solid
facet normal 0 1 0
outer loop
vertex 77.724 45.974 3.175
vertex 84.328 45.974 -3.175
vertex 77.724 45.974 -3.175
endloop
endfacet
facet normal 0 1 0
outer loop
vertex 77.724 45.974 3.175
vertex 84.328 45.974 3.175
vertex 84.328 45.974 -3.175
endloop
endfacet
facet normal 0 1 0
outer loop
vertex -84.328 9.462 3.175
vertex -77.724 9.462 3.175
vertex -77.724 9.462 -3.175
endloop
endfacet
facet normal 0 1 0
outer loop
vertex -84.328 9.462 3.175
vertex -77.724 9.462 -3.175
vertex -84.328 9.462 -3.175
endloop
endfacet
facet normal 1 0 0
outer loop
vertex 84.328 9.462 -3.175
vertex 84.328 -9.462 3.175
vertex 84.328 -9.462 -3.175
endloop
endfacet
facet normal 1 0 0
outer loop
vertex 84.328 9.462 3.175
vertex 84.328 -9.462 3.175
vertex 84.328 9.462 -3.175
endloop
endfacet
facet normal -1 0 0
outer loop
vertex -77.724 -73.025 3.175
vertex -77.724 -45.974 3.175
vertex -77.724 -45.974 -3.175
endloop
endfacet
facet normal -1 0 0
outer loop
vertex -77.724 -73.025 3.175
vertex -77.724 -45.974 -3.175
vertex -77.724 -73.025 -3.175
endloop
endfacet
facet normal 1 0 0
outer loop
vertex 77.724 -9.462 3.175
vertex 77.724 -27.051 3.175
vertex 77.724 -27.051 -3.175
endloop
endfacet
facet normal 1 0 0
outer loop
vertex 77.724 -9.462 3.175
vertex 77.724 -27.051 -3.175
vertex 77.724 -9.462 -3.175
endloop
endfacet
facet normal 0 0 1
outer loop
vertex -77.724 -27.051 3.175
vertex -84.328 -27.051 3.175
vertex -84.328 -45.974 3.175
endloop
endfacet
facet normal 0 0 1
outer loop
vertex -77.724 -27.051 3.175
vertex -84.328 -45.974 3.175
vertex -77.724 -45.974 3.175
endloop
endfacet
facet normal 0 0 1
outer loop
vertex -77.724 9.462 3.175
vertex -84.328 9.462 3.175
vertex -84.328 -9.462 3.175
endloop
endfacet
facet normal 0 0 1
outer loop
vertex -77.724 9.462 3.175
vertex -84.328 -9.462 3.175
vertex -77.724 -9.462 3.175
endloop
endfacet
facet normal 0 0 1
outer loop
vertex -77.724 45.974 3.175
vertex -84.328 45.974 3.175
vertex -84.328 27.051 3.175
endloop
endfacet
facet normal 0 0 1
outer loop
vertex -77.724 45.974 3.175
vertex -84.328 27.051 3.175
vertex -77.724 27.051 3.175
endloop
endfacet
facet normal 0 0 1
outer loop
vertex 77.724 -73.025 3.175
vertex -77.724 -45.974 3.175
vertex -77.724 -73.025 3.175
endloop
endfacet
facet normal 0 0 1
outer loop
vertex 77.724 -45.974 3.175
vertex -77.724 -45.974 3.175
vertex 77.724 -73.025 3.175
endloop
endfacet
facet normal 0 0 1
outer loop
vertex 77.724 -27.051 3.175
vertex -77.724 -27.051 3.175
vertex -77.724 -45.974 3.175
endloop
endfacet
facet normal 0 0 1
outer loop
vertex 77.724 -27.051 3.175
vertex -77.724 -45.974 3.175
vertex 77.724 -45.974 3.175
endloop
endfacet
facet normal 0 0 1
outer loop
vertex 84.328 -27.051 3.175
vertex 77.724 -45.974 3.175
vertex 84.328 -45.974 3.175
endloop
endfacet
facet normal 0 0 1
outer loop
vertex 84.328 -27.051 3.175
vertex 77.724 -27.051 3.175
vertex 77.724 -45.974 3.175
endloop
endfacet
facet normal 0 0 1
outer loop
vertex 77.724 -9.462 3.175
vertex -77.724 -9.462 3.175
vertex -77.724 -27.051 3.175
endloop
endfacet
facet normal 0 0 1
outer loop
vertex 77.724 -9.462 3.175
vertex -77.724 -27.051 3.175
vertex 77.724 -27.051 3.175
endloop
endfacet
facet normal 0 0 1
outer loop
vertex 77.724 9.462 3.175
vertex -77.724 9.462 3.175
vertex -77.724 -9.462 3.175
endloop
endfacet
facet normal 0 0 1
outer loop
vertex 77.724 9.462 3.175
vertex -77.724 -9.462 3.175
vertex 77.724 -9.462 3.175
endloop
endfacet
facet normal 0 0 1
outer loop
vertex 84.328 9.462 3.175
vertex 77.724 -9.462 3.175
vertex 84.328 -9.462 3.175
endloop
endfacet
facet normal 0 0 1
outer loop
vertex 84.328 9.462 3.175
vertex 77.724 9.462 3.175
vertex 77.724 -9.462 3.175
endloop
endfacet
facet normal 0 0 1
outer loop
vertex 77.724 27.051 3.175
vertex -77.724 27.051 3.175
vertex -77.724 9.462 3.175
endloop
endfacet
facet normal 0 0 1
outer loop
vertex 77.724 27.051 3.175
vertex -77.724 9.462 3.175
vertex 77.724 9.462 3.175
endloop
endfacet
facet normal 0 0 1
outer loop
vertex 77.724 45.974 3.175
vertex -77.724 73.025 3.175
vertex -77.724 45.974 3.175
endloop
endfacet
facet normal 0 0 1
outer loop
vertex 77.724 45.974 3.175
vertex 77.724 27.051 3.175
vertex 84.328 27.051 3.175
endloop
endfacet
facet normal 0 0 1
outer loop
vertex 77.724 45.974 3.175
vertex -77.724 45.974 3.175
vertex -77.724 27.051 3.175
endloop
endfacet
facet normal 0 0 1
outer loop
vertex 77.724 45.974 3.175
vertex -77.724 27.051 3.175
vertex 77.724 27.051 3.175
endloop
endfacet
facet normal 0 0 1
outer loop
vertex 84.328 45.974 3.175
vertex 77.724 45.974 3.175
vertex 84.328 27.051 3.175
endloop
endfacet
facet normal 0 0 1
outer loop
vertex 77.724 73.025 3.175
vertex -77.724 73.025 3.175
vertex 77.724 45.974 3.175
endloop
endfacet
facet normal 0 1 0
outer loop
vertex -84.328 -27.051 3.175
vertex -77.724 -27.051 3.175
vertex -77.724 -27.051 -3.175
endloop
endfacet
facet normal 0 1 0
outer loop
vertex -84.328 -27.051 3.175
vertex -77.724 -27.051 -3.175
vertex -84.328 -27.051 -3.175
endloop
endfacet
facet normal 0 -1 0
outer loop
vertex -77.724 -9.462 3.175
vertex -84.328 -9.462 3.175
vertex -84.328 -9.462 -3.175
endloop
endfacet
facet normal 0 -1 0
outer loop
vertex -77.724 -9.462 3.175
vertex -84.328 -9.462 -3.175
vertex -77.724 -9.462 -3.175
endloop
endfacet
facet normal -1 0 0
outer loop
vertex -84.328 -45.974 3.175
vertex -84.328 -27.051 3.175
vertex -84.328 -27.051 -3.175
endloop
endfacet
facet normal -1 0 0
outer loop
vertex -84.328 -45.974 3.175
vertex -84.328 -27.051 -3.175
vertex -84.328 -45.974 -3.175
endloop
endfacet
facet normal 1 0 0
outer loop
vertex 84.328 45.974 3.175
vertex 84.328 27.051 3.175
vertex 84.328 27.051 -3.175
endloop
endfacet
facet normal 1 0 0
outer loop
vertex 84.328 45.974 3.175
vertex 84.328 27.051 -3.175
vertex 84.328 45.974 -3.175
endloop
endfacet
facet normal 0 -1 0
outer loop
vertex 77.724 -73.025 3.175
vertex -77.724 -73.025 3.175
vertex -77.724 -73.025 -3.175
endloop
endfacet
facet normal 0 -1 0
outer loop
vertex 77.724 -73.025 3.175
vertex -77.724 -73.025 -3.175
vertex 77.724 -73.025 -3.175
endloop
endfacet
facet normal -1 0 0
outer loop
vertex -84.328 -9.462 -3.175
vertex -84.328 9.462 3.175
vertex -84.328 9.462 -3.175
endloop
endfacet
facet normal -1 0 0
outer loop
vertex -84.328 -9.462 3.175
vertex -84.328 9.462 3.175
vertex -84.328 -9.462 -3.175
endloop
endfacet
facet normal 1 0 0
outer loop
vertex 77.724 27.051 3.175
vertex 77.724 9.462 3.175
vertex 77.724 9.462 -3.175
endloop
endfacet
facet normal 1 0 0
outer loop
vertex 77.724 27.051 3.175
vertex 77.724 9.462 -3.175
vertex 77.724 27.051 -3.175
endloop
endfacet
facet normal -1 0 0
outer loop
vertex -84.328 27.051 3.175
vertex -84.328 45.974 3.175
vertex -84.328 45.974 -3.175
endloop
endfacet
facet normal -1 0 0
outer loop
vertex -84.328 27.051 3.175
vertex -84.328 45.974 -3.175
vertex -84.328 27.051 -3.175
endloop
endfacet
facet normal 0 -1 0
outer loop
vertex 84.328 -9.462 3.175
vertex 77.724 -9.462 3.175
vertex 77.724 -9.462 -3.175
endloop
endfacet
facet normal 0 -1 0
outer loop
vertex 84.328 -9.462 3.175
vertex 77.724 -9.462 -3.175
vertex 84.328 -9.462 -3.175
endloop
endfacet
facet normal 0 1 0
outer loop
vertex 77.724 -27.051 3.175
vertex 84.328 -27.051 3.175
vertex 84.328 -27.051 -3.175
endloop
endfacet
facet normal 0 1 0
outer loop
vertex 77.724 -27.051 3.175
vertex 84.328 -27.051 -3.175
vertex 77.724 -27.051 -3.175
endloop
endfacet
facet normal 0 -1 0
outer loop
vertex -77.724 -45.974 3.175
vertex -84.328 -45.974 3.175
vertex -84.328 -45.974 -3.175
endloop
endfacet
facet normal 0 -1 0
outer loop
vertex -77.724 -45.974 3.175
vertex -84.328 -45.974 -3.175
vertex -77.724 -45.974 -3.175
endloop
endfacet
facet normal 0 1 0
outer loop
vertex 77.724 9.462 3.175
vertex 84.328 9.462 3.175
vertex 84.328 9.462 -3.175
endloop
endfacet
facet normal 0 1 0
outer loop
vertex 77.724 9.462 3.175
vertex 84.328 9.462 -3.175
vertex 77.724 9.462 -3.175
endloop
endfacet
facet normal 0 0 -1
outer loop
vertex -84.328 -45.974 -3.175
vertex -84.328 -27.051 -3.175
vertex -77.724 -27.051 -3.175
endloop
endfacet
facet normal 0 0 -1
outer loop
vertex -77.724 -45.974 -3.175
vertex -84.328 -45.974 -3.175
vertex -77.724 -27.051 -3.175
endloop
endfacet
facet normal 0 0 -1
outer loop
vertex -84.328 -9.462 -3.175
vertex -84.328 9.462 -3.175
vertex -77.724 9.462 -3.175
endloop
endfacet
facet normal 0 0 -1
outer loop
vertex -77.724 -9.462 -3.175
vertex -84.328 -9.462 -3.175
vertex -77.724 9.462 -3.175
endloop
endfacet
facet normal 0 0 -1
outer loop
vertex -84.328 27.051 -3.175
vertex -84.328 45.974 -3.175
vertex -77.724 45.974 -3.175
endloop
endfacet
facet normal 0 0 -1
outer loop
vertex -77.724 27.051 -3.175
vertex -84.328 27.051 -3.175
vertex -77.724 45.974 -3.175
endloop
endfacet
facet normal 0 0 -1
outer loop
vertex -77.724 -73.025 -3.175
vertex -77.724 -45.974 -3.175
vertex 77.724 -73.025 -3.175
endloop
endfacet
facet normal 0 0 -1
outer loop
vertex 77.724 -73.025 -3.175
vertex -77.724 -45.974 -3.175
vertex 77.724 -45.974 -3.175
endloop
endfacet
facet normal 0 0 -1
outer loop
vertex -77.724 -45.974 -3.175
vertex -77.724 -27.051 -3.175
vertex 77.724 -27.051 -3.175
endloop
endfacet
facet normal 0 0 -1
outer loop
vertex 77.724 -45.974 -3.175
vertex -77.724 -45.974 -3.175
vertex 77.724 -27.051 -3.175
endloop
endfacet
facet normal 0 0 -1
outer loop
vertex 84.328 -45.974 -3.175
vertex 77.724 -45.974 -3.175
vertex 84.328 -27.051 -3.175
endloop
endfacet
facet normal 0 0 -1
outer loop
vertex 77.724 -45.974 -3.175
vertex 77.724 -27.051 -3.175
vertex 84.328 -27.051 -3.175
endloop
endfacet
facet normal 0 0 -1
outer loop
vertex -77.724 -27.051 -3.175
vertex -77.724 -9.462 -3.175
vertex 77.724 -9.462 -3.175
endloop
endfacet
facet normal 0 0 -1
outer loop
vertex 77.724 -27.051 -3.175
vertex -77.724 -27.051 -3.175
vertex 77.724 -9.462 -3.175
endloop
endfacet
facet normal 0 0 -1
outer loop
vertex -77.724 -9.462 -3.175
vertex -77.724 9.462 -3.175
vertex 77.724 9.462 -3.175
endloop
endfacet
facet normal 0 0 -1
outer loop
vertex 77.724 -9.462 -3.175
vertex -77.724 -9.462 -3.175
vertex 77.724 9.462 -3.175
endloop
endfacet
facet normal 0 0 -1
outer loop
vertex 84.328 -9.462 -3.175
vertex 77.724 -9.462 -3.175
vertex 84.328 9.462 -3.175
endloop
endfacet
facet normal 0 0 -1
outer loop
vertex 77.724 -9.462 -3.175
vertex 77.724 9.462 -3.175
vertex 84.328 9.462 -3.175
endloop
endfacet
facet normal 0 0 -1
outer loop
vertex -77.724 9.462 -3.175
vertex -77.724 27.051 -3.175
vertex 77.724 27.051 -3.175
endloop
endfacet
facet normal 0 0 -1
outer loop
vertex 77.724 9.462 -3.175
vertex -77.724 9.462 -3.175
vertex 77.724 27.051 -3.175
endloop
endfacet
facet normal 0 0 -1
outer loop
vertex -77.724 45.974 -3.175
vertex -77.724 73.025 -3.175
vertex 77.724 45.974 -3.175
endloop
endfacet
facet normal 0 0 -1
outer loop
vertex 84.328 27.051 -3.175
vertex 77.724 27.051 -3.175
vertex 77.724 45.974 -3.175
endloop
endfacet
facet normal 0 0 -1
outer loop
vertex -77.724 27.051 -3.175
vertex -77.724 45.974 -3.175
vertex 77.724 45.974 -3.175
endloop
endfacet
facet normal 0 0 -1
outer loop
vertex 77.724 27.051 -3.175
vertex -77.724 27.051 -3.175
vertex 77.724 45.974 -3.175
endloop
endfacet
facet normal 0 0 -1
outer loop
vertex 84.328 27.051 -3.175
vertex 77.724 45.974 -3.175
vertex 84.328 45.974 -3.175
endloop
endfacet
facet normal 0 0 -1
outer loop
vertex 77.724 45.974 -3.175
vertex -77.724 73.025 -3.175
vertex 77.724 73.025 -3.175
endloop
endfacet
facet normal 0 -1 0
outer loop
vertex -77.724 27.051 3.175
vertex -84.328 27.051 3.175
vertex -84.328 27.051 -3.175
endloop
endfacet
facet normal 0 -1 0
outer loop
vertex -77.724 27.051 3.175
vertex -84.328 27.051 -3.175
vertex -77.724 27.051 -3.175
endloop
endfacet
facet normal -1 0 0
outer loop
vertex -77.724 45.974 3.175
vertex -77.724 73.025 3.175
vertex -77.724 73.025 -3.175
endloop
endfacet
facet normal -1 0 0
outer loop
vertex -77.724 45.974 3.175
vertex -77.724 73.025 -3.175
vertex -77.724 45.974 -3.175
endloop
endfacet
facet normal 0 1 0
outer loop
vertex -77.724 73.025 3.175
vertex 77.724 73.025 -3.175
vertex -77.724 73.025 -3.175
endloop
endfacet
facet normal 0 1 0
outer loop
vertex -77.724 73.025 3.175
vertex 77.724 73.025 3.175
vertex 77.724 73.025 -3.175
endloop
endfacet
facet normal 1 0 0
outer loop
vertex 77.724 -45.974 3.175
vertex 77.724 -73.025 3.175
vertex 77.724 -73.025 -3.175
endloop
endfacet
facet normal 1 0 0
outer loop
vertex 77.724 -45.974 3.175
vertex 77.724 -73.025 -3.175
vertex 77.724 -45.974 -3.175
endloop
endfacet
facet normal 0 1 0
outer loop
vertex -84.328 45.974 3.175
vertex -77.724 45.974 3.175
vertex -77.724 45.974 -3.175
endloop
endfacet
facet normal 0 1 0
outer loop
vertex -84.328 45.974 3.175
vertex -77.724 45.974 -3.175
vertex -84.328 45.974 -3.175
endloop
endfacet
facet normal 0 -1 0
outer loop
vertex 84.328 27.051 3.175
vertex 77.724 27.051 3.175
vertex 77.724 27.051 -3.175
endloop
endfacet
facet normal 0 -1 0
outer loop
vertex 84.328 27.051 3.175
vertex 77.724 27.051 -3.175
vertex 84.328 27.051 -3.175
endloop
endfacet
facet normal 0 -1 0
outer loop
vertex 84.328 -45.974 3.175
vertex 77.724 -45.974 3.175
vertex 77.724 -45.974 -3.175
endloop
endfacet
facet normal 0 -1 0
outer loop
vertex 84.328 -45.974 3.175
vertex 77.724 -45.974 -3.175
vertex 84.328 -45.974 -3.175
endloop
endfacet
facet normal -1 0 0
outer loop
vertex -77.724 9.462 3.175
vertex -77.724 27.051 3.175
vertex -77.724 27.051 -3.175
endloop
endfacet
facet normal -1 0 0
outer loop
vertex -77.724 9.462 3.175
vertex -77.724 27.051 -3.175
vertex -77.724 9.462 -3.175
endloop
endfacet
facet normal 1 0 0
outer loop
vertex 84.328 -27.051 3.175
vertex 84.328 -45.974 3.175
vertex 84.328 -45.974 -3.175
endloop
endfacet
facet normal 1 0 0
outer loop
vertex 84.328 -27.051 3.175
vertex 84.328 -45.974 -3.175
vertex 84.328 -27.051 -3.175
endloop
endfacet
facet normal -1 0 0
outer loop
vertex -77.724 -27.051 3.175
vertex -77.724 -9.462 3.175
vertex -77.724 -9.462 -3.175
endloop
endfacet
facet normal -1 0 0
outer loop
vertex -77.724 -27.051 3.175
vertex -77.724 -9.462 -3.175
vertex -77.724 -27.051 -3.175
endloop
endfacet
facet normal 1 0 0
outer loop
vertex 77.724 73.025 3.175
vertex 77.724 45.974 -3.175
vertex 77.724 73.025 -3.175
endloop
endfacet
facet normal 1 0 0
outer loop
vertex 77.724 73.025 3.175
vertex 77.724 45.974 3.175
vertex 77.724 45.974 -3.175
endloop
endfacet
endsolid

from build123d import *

# Parameters (mm, degrees)
BOSS_EXTRUDE1_DEPTH = 3.175


with BuildPart() as part:
    # Sketch1 → Boss-Extrude1 (new body, symmetric)
    with BuildSketch(Plane.XY):
        Polygon((77.724, 73.025), (-77.724, 73.025), (-77.724, 45.974), (-84.328, 45.974), (-84.328, 27.051), (-77.724, 27.051), (-77.724, 9.4615), (-84.328, 9.4615), (-84.328, -9.4615), (-77.724, -9.4615), (-77.724, -27.051), (-84.328, -27.051), (-84.328, -45.974), (-77.724, -45.974), (-77.724, -73.025), (77.724, -73.025), (77.724, -45.974), (84.328, -45.974), (84.328, -27.051), (77.724, -27.051), (77.724, -9.4615), (84.328, -9.4615), (84.328, 9.4615), (77.724, 9.4615), (77.724, 27.051), (84.328, 27.051), (84.328, 45.974), (77.724, 45.974), align=None)
    extrude(amount=BOSS_EXTRUDE1_DEPTH, both=True)


solid = part.part
